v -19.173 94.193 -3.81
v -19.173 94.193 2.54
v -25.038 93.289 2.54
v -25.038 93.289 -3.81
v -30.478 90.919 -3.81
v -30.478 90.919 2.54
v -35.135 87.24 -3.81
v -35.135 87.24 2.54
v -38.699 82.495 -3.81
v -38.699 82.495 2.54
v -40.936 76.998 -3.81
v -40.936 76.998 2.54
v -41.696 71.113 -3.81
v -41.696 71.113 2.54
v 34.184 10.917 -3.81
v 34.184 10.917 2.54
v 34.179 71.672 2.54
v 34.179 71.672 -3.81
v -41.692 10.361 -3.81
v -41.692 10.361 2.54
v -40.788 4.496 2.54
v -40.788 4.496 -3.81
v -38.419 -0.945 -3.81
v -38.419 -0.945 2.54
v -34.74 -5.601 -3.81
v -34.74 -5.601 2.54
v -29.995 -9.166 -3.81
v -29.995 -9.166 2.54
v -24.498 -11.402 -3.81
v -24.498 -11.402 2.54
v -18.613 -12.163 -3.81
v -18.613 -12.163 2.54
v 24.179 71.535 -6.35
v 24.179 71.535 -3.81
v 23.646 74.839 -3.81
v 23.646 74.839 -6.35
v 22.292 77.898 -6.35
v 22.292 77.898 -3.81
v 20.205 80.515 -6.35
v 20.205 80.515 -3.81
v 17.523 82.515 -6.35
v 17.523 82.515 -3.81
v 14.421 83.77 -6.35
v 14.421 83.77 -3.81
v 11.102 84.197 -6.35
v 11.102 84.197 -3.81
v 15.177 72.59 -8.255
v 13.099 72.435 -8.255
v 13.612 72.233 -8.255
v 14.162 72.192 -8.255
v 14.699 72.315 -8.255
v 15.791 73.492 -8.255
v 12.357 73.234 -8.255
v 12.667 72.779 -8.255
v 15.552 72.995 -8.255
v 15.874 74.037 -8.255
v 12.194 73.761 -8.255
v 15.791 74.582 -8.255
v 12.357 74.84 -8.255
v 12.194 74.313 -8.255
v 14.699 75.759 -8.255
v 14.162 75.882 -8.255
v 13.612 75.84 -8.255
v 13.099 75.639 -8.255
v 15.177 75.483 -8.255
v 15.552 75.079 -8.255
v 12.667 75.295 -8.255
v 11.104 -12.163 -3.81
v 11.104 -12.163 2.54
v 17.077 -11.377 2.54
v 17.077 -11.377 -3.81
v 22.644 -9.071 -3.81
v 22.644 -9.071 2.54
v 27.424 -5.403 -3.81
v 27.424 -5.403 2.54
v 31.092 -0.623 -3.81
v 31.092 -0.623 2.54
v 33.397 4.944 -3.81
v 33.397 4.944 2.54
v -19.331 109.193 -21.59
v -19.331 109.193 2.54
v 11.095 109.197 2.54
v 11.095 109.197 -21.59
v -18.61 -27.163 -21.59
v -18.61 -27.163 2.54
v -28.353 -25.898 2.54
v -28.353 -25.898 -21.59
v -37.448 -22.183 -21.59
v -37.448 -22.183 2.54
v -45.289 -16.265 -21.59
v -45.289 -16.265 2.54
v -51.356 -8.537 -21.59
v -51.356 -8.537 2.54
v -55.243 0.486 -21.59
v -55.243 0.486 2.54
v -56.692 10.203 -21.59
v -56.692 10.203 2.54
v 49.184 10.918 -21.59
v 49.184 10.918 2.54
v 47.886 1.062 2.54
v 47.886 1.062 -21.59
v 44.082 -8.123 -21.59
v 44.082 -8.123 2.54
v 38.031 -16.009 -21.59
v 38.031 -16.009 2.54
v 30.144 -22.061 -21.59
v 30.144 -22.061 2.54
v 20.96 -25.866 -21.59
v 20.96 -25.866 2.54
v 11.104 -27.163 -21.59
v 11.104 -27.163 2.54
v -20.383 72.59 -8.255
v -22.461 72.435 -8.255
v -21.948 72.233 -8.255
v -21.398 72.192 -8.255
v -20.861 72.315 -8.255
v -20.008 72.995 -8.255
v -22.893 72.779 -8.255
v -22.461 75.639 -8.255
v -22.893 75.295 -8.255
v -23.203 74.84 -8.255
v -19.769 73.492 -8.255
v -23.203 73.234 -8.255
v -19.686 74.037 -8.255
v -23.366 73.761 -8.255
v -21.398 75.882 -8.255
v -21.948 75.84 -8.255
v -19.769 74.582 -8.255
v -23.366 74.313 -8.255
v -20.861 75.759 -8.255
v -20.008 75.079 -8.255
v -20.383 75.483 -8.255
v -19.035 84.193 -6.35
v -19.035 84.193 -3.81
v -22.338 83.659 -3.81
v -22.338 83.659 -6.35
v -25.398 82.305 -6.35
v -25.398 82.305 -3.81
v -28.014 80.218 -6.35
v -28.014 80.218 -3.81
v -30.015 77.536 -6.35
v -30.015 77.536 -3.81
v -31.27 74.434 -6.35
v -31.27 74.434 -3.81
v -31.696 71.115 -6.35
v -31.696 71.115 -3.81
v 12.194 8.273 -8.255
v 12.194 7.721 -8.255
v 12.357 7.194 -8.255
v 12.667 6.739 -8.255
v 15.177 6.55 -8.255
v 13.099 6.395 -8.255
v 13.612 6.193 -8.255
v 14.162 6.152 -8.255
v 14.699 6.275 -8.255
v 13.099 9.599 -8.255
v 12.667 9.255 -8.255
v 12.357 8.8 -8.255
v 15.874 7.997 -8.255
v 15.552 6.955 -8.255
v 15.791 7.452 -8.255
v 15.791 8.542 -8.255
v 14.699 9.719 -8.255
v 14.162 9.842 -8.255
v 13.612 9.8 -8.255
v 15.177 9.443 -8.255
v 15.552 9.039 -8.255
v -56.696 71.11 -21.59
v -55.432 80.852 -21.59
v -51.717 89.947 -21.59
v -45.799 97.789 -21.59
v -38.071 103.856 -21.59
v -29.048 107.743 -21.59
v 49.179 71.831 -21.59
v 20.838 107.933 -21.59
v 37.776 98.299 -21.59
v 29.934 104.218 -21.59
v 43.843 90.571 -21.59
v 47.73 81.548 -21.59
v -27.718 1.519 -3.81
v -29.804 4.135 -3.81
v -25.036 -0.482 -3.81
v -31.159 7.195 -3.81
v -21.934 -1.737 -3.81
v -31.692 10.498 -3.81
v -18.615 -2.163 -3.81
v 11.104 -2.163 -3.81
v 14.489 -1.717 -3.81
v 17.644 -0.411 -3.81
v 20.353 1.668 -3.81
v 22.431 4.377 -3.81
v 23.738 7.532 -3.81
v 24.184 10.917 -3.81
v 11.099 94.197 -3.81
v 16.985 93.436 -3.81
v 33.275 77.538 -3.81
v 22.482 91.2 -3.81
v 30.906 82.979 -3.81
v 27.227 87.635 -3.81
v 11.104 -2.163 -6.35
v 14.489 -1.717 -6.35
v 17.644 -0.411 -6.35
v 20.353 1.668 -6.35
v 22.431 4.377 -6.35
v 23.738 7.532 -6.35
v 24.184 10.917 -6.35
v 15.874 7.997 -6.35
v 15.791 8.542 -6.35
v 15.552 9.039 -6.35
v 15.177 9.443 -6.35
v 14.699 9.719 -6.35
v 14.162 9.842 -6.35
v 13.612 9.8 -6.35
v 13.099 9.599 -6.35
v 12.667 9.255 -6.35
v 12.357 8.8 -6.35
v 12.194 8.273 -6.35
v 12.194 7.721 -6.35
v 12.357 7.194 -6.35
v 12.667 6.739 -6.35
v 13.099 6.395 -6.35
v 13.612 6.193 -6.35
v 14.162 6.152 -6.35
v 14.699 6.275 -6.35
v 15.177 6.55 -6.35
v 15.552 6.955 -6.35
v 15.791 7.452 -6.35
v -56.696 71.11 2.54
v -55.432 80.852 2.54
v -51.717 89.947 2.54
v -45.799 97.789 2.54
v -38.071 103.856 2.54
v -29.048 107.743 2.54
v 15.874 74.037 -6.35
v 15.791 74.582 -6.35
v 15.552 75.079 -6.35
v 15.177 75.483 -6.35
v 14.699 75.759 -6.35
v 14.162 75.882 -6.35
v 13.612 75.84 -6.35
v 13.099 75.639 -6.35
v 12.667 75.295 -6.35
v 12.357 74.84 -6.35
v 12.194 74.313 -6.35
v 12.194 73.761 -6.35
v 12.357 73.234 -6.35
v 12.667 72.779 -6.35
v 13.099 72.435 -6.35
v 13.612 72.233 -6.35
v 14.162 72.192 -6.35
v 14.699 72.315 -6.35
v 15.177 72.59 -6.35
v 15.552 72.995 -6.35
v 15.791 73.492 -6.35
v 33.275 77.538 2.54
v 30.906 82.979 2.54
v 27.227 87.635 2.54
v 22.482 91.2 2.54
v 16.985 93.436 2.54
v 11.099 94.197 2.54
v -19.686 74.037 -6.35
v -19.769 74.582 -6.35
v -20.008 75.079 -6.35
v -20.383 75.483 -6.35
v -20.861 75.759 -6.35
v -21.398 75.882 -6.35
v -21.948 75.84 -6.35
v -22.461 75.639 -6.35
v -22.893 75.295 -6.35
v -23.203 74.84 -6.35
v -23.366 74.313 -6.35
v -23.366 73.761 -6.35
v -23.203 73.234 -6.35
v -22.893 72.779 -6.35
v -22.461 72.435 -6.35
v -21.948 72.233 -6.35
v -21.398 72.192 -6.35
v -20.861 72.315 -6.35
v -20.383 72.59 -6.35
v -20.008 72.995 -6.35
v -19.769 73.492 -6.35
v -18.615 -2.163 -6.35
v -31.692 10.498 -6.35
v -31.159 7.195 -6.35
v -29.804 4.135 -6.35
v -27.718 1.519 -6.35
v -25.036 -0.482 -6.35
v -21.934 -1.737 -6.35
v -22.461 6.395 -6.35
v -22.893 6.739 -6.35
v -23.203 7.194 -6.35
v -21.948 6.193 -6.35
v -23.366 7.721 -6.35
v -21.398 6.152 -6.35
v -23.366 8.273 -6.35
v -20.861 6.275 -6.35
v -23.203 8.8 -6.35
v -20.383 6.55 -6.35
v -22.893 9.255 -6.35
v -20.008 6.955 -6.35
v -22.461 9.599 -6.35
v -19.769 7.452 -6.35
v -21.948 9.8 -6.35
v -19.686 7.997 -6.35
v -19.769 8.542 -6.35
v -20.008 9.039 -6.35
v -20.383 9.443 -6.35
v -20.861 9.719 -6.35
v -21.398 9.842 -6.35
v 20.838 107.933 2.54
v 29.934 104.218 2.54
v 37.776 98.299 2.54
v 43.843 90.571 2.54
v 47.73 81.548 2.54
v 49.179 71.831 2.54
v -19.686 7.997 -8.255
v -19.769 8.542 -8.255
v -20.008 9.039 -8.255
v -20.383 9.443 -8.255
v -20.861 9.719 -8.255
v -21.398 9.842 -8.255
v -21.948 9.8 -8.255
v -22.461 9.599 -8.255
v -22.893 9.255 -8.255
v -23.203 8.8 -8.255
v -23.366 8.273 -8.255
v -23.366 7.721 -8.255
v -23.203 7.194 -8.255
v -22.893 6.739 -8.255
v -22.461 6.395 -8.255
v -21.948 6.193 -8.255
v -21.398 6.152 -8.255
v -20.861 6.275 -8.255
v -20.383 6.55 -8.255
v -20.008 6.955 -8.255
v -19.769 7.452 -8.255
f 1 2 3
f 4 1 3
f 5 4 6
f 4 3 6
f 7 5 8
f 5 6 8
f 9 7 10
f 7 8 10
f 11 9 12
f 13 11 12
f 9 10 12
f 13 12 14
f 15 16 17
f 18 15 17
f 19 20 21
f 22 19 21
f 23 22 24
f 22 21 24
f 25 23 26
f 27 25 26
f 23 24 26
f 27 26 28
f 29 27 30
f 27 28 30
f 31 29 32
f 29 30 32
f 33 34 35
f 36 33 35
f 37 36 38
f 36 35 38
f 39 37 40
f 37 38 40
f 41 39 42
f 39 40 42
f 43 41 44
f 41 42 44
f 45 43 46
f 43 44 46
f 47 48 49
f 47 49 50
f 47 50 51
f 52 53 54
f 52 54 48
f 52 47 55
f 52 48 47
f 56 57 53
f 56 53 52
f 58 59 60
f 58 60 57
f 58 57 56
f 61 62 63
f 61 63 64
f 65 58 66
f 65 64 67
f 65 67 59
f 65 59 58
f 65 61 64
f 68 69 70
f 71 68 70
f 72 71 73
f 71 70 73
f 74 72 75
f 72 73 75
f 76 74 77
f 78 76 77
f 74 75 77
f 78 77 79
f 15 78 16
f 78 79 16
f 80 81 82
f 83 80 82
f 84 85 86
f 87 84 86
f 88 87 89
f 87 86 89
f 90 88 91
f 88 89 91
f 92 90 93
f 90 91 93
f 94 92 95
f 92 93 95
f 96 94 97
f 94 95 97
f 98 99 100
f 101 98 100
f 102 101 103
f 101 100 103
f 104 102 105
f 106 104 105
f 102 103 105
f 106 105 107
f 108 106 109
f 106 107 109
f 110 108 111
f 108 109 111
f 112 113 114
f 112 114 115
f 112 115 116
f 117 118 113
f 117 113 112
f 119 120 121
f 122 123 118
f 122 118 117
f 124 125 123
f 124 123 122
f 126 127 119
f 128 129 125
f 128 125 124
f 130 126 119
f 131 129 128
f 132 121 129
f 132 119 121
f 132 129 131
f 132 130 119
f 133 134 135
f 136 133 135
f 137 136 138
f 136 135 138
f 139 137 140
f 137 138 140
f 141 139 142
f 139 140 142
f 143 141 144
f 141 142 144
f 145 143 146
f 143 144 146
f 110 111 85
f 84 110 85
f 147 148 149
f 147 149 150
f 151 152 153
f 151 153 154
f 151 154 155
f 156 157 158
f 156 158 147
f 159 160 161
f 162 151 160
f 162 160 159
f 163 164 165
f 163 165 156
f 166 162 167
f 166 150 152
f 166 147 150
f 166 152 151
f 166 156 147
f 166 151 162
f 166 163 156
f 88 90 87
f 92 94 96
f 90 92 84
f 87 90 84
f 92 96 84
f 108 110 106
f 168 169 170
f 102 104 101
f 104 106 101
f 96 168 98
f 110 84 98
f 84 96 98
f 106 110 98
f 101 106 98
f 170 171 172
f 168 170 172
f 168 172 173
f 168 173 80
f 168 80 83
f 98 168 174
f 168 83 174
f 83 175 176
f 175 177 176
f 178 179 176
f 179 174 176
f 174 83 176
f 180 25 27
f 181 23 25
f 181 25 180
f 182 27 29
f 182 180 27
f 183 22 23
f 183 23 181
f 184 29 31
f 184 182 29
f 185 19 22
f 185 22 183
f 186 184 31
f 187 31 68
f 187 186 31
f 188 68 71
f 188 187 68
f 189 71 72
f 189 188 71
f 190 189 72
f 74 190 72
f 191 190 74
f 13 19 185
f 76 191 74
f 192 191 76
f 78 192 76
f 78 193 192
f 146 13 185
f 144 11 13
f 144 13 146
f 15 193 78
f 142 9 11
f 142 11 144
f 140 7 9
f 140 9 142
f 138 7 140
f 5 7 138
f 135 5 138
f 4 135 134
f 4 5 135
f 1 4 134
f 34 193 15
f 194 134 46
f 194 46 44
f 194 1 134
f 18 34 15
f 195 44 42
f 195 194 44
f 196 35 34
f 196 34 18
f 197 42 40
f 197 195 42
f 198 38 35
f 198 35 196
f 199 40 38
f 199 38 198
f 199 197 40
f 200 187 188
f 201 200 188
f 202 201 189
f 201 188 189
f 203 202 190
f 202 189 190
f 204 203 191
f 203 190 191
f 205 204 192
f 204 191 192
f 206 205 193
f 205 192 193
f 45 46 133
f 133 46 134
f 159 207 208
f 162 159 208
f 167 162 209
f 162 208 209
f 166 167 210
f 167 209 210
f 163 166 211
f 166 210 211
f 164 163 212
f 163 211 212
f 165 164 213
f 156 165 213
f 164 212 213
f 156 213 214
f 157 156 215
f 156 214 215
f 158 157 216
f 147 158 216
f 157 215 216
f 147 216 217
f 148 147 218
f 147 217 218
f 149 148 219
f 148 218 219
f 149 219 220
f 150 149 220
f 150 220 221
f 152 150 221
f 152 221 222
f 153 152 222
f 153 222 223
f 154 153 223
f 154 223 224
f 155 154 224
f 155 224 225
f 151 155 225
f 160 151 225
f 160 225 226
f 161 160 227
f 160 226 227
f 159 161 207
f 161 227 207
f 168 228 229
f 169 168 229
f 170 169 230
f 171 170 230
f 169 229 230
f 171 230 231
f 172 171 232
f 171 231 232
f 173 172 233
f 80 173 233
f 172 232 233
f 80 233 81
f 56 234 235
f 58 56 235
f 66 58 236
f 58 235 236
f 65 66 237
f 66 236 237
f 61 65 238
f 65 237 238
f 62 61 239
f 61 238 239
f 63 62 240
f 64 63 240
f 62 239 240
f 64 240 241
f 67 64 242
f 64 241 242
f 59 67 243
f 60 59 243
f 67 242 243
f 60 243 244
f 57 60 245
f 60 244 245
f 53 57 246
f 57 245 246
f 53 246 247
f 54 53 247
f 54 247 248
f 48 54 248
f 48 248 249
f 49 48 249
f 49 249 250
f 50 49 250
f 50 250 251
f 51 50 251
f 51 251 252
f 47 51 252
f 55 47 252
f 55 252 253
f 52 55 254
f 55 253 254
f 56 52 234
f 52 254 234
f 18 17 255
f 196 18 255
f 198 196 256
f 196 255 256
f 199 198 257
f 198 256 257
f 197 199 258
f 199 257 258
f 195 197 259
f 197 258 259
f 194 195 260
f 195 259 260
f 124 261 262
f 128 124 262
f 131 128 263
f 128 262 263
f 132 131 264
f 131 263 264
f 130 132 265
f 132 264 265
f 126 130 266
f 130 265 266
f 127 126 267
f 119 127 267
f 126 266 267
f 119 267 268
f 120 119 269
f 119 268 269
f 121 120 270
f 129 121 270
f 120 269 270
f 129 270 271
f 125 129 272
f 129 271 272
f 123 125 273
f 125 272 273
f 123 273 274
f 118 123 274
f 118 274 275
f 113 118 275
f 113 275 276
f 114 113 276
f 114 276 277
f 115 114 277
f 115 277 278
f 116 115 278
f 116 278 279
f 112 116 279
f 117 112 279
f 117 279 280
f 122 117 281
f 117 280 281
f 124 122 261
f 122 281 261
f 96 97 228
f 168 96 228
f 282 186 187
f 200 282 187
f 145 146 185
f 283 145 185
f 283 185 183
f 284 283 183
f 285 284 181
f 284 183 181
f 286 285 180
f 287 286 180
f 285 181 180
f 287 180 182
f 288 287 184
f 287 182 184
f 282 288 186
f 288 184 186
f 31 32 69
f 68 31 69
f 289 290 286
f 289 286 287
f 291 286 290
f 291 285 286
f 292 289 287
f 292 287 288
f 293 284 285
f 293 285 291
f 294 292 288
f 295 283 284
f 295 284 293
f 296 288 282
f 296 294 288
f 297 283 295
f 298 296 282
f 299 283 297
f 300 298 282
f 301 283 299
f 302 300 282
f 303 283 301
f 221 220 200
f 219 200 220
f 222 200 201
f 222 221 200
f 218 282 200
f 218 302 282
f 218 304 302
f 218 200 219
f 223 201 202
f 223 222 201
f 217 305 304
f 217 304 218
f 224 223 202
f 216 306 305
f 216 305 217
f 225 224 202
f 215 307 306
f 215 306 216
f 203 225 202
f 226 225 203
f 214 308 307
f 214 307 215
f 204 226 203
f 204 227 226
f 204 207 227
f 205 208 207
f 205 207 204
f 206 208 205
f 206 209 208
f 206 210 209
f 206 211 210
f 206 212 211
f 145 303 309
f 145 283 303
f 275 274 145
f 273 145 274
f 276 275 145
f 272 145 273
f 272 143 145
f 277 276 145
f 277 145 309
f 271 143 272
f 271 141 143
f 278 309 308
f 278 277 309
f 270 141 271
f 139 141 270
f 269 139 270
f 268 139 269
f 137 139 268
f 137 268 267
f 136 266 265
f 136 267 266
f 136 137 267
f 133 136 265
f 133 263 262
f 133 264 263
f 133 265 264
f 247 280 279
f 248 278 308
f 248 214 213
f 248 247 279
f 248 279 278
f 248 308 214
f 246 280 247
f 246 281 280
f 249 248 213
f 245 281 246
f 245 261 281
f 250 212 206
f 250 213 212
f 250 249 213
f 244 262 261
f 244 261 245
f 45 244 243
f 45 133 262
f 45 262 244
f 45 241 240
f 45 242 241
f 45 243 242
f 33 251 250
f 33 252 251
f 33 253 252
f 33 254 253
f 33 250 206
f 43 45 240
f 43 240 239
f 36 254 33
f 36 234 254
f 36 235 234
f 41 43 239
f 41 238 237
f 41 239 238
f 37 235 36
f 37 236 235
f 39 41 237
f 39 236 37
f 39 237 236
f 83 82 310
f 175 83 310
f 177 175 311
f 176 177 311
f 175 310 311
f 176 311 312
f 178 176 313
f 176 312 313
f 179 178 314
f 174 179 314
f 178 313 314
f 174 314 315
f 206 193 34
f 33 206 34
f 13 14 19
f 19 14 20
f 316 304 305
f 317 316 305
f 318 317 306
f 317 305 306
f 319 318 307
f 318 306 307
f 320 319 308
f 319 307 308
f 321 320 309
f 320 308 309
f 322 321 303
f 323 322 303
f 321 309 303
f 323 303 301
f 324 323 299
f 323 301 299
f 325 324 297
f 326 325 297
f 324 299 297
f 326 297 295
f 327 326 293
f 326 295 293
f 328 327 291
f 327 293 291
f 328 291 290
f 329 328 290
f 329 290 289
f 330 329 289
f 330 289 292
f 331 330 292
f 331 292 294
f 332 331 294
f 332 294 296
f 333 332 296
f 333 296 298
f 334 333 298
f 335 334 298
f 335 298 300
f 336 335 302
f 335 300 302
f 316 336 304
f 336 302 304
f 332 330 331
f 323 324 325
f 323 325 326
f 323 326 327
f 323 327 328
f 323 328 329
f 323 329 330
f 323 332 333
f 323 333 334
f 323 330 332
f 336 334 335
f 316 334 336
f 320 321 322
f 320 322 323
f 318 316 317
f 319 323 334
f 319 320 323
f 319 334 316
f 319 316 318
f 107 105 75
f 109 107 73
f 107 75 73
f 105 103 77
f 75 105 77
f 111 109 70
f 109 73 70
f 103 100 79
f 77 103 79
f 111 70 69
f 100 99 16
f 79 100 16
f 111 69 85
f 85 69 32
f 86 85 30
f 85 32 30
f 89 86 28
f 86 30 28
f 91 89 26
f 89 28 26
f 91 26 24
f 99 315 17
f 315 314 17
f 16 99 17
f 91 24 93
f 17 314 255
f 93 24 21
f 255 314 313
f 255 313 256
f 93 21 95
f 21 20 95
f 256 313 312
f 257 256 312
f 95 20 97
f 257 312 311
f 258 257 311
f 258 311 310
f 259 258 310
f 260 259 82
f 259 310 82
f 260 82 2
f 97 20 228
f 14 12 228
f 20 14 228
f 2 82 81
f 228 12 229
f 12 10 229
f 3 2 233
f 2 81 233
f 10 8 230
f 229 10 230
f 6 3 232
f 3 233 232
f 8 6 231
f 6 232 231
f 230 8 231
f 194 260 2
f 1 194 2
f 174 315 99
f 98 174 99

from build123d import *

# Parameters (mm, degrees)
BOSS_EXTRUDE1_START = 2.54
BOSS_EXTRUDE1_DEPTH = 24.13
BOSS_EXTRUDE2_START = -3.81
BOSS_EXTRUDE2_DEPTH = 17.78
BOSS_EXTRUDE3_START = -6.35
BOSS_EXTRUDE3_DEPTH = 15.24
SKETCH6_R           = 1.8499963
CUT_EXTRUDE1_DEPTH  = 1.905


with BuildPart() as part:
    # Sketch3 → Boss-Extrude1 (new body)
    with BuildSketch(Plane.XY.offset(BOSS_EXTRUDE1_START)):
        with BuildLine():
            Line((49.179418991, 71.83051854), (49.183589013, 10.917946581))
            ThreePointArc((49.183589013, 10.917946581), (38.030613987, -16.009405686), (11.103592243, -27.163178684))
            Line((11.103592243, -27.163178684), (-18.610242915, -27.163177904))
            ThreePointArc((-18.610242915, -27.163177904), (-45.28949294, -16.264577298), (-56.692241, 10.203124182))
            Line((-56.692241, 10.203124182), (-56.6964099, 71.109527092))
            ThreePointArc((-56.6964099, 71.109527092), (-45.79864203, 97.789054805), (-19.33135902, 109.192627907))
            Line((-19.33135902, 109.192627907), (11.095154423, 109.196819916))
            ThreePointArc((11.095154423, 109.196819916), (37.775861992, 98.2990136), (49.179418991, 71.83051854))
        make_face()
        with BuildLine():
            ThreePointArc((34.179429779, 71.6724157), (27.226556901, 87.635128483), (11.099100878, 94.196820553))
            Line((11.099100878, 94.196820553), (-19.172523946, 94.192649649))
            ThreePointArc((-19.172523946, 94.192649649), (-35.134735798, 87.239771138), (-41.696410425, 71.112801401))
            Line((-41.696410425, 71.112801401), (-41.692251788, 10.361226959))
            ThreePointArc((-41.692251788, 10.361226959), (-34.73971192, -5.601160899), (-18.612853466, -12.163178358))
            Line((-18.612853466, -12.163178358), (11.103590646, -12.163178684))
            ThreePointArc((11.103590646, -12.163178684), (27.423777198, -5.403039043), (34.183589032, 10.91728329))
            Line((34.183589032, 10.91728329), (34.179429779, 71.6724157))
        make_face(mode=Mode.SUBTRACT)
    extrude(amount=-BOSS_EXTRUDE1_DEPTH)

    # Sketch4 → Boss-Extrude2 (add)
    with BuildSketch(Plane.XY.offset(BOSS_EXTRUDE2_START)):
        with BuildLine():
            Line((-18.612853466, -12.163178358), (11.103590646, -12.163178684))
            ThreePointArc((11.103590646, -12.163178684), (27.423777198, -5.403039043), (34.183589032, 10.91728329))
            Line((34.183589032, 10.91728329), (34.179429779, 71.6724157))
            ThreePointArc((34.179429779, 71.6724157), (27.226556901, 87.635128483), (11.099100878, 94.196820553))
            Line((11.099100878, 94.196820553), (-19.172523946, 94.192649649))
            ThreePointArc((-19.172523946, 94.192649649), (-35.134735798, 87.239771138), (-41.696410425, 71.112801401))
            Line((-41.696410425, 71.112801401), (-41.692251788, 10.361226959))
            ThreePointArc((-41.692251788, 10.361226959), (-34.73971192, -5.601160899), (-18.612853466, -12.163178358))
        make_face()
        with BuildLine():
            Line((-31.696410748, 71.115398672), (-31.692261274, 10.49840121))
            ThreePointArc((-31.692261274, 10.49840121), (-27.7179266, 1.519183246), (-18.615075252, -2.163178586))
            Line((-18.615075252, -2.163178586), (11.103589581, -2.163178687))
            ThreePointArc((11.103589581, -2.163178687), (20.352576379, 1.667895757), (24.183589038, 10.916908147))
            Line((24.183589038, 10.916908147), (24.179439208, 71.535241416))
            ThreePointArc((24.179439208, 71.535241416), (20.205041728, 80.514520126), (11.102078372, 84.196820986))
            Line((11.102078372, 84.196820986), (-19.034923813, 84.1926686))
            ThreePointArc((-19.034923813, 84.1926686), (-28.014111485, 80.21827234), (-31.696410748, 71.115398672))
        make_face(mode=Mode.SUBTRACT)
    extrude(amount=-BOSS_EXTRUDE2_DEPTH)

    # Sketch5 → Boss-Extrude3 (add)
    with BuildSketch(Plane.XY.offset(BOSS_EXTRUDE3_START)):
        with BuildLine():
            Line((-18.615075252, -2.163178586), (11.103589581, -2.163178687))
            ThreePointArc((11.103589581, -2.163178687), (20.352576379, 1.667895757), (24.183589038, 10.916908147))
            Line((24.183589038, 10.916908147), (24.179439208, 71.535241416))
            ThreePointArc((24.179439208, 71.535241416), (20.205041728, 80.514520126), (11.102078372, 84.196820986))
            Line((11.102078372, 84.196820986), (-19.034923813, 84.1926686))
            ThreePointArc((-19.034923813, 84.1926686), (-28.014111485, 80.21827234), (-31.696410748, 71.115398672))
            Line((-31.696410748, 71.115398672), (-31.692261274, 10.49840121))
            ThreePointArc((-31.692261274, 10.49840121), (-27.7179266, 1.519183246), (-18.615075252, -2.163178586))
        make_face()
    extrude(amount=-BOSS_EXTRUDE3_DEPTH)

    # Sketch6 → Cut-Extrude1 (cut)
    with BuildSketch(Plane.XY.offset(-6.35)):
        with Locations((-21.53641096, 74.036821312)):
            Circle(SKETCH6_R)
        with Locations((14.02358904, 74.036821312)):
            Circle(SKETCH6_R)
        with Locations((14.02358904, 7.996821312)):
            Circle(SKETCH6_R)
        with Locations((-21.53641096, 7.996821312)):
            Circle(SKETCH6_R)
    extrude(amount=-CUT_EXTRUDE1_DEPTH, mode=Mode.SUBTRACT)


solid = part.part
